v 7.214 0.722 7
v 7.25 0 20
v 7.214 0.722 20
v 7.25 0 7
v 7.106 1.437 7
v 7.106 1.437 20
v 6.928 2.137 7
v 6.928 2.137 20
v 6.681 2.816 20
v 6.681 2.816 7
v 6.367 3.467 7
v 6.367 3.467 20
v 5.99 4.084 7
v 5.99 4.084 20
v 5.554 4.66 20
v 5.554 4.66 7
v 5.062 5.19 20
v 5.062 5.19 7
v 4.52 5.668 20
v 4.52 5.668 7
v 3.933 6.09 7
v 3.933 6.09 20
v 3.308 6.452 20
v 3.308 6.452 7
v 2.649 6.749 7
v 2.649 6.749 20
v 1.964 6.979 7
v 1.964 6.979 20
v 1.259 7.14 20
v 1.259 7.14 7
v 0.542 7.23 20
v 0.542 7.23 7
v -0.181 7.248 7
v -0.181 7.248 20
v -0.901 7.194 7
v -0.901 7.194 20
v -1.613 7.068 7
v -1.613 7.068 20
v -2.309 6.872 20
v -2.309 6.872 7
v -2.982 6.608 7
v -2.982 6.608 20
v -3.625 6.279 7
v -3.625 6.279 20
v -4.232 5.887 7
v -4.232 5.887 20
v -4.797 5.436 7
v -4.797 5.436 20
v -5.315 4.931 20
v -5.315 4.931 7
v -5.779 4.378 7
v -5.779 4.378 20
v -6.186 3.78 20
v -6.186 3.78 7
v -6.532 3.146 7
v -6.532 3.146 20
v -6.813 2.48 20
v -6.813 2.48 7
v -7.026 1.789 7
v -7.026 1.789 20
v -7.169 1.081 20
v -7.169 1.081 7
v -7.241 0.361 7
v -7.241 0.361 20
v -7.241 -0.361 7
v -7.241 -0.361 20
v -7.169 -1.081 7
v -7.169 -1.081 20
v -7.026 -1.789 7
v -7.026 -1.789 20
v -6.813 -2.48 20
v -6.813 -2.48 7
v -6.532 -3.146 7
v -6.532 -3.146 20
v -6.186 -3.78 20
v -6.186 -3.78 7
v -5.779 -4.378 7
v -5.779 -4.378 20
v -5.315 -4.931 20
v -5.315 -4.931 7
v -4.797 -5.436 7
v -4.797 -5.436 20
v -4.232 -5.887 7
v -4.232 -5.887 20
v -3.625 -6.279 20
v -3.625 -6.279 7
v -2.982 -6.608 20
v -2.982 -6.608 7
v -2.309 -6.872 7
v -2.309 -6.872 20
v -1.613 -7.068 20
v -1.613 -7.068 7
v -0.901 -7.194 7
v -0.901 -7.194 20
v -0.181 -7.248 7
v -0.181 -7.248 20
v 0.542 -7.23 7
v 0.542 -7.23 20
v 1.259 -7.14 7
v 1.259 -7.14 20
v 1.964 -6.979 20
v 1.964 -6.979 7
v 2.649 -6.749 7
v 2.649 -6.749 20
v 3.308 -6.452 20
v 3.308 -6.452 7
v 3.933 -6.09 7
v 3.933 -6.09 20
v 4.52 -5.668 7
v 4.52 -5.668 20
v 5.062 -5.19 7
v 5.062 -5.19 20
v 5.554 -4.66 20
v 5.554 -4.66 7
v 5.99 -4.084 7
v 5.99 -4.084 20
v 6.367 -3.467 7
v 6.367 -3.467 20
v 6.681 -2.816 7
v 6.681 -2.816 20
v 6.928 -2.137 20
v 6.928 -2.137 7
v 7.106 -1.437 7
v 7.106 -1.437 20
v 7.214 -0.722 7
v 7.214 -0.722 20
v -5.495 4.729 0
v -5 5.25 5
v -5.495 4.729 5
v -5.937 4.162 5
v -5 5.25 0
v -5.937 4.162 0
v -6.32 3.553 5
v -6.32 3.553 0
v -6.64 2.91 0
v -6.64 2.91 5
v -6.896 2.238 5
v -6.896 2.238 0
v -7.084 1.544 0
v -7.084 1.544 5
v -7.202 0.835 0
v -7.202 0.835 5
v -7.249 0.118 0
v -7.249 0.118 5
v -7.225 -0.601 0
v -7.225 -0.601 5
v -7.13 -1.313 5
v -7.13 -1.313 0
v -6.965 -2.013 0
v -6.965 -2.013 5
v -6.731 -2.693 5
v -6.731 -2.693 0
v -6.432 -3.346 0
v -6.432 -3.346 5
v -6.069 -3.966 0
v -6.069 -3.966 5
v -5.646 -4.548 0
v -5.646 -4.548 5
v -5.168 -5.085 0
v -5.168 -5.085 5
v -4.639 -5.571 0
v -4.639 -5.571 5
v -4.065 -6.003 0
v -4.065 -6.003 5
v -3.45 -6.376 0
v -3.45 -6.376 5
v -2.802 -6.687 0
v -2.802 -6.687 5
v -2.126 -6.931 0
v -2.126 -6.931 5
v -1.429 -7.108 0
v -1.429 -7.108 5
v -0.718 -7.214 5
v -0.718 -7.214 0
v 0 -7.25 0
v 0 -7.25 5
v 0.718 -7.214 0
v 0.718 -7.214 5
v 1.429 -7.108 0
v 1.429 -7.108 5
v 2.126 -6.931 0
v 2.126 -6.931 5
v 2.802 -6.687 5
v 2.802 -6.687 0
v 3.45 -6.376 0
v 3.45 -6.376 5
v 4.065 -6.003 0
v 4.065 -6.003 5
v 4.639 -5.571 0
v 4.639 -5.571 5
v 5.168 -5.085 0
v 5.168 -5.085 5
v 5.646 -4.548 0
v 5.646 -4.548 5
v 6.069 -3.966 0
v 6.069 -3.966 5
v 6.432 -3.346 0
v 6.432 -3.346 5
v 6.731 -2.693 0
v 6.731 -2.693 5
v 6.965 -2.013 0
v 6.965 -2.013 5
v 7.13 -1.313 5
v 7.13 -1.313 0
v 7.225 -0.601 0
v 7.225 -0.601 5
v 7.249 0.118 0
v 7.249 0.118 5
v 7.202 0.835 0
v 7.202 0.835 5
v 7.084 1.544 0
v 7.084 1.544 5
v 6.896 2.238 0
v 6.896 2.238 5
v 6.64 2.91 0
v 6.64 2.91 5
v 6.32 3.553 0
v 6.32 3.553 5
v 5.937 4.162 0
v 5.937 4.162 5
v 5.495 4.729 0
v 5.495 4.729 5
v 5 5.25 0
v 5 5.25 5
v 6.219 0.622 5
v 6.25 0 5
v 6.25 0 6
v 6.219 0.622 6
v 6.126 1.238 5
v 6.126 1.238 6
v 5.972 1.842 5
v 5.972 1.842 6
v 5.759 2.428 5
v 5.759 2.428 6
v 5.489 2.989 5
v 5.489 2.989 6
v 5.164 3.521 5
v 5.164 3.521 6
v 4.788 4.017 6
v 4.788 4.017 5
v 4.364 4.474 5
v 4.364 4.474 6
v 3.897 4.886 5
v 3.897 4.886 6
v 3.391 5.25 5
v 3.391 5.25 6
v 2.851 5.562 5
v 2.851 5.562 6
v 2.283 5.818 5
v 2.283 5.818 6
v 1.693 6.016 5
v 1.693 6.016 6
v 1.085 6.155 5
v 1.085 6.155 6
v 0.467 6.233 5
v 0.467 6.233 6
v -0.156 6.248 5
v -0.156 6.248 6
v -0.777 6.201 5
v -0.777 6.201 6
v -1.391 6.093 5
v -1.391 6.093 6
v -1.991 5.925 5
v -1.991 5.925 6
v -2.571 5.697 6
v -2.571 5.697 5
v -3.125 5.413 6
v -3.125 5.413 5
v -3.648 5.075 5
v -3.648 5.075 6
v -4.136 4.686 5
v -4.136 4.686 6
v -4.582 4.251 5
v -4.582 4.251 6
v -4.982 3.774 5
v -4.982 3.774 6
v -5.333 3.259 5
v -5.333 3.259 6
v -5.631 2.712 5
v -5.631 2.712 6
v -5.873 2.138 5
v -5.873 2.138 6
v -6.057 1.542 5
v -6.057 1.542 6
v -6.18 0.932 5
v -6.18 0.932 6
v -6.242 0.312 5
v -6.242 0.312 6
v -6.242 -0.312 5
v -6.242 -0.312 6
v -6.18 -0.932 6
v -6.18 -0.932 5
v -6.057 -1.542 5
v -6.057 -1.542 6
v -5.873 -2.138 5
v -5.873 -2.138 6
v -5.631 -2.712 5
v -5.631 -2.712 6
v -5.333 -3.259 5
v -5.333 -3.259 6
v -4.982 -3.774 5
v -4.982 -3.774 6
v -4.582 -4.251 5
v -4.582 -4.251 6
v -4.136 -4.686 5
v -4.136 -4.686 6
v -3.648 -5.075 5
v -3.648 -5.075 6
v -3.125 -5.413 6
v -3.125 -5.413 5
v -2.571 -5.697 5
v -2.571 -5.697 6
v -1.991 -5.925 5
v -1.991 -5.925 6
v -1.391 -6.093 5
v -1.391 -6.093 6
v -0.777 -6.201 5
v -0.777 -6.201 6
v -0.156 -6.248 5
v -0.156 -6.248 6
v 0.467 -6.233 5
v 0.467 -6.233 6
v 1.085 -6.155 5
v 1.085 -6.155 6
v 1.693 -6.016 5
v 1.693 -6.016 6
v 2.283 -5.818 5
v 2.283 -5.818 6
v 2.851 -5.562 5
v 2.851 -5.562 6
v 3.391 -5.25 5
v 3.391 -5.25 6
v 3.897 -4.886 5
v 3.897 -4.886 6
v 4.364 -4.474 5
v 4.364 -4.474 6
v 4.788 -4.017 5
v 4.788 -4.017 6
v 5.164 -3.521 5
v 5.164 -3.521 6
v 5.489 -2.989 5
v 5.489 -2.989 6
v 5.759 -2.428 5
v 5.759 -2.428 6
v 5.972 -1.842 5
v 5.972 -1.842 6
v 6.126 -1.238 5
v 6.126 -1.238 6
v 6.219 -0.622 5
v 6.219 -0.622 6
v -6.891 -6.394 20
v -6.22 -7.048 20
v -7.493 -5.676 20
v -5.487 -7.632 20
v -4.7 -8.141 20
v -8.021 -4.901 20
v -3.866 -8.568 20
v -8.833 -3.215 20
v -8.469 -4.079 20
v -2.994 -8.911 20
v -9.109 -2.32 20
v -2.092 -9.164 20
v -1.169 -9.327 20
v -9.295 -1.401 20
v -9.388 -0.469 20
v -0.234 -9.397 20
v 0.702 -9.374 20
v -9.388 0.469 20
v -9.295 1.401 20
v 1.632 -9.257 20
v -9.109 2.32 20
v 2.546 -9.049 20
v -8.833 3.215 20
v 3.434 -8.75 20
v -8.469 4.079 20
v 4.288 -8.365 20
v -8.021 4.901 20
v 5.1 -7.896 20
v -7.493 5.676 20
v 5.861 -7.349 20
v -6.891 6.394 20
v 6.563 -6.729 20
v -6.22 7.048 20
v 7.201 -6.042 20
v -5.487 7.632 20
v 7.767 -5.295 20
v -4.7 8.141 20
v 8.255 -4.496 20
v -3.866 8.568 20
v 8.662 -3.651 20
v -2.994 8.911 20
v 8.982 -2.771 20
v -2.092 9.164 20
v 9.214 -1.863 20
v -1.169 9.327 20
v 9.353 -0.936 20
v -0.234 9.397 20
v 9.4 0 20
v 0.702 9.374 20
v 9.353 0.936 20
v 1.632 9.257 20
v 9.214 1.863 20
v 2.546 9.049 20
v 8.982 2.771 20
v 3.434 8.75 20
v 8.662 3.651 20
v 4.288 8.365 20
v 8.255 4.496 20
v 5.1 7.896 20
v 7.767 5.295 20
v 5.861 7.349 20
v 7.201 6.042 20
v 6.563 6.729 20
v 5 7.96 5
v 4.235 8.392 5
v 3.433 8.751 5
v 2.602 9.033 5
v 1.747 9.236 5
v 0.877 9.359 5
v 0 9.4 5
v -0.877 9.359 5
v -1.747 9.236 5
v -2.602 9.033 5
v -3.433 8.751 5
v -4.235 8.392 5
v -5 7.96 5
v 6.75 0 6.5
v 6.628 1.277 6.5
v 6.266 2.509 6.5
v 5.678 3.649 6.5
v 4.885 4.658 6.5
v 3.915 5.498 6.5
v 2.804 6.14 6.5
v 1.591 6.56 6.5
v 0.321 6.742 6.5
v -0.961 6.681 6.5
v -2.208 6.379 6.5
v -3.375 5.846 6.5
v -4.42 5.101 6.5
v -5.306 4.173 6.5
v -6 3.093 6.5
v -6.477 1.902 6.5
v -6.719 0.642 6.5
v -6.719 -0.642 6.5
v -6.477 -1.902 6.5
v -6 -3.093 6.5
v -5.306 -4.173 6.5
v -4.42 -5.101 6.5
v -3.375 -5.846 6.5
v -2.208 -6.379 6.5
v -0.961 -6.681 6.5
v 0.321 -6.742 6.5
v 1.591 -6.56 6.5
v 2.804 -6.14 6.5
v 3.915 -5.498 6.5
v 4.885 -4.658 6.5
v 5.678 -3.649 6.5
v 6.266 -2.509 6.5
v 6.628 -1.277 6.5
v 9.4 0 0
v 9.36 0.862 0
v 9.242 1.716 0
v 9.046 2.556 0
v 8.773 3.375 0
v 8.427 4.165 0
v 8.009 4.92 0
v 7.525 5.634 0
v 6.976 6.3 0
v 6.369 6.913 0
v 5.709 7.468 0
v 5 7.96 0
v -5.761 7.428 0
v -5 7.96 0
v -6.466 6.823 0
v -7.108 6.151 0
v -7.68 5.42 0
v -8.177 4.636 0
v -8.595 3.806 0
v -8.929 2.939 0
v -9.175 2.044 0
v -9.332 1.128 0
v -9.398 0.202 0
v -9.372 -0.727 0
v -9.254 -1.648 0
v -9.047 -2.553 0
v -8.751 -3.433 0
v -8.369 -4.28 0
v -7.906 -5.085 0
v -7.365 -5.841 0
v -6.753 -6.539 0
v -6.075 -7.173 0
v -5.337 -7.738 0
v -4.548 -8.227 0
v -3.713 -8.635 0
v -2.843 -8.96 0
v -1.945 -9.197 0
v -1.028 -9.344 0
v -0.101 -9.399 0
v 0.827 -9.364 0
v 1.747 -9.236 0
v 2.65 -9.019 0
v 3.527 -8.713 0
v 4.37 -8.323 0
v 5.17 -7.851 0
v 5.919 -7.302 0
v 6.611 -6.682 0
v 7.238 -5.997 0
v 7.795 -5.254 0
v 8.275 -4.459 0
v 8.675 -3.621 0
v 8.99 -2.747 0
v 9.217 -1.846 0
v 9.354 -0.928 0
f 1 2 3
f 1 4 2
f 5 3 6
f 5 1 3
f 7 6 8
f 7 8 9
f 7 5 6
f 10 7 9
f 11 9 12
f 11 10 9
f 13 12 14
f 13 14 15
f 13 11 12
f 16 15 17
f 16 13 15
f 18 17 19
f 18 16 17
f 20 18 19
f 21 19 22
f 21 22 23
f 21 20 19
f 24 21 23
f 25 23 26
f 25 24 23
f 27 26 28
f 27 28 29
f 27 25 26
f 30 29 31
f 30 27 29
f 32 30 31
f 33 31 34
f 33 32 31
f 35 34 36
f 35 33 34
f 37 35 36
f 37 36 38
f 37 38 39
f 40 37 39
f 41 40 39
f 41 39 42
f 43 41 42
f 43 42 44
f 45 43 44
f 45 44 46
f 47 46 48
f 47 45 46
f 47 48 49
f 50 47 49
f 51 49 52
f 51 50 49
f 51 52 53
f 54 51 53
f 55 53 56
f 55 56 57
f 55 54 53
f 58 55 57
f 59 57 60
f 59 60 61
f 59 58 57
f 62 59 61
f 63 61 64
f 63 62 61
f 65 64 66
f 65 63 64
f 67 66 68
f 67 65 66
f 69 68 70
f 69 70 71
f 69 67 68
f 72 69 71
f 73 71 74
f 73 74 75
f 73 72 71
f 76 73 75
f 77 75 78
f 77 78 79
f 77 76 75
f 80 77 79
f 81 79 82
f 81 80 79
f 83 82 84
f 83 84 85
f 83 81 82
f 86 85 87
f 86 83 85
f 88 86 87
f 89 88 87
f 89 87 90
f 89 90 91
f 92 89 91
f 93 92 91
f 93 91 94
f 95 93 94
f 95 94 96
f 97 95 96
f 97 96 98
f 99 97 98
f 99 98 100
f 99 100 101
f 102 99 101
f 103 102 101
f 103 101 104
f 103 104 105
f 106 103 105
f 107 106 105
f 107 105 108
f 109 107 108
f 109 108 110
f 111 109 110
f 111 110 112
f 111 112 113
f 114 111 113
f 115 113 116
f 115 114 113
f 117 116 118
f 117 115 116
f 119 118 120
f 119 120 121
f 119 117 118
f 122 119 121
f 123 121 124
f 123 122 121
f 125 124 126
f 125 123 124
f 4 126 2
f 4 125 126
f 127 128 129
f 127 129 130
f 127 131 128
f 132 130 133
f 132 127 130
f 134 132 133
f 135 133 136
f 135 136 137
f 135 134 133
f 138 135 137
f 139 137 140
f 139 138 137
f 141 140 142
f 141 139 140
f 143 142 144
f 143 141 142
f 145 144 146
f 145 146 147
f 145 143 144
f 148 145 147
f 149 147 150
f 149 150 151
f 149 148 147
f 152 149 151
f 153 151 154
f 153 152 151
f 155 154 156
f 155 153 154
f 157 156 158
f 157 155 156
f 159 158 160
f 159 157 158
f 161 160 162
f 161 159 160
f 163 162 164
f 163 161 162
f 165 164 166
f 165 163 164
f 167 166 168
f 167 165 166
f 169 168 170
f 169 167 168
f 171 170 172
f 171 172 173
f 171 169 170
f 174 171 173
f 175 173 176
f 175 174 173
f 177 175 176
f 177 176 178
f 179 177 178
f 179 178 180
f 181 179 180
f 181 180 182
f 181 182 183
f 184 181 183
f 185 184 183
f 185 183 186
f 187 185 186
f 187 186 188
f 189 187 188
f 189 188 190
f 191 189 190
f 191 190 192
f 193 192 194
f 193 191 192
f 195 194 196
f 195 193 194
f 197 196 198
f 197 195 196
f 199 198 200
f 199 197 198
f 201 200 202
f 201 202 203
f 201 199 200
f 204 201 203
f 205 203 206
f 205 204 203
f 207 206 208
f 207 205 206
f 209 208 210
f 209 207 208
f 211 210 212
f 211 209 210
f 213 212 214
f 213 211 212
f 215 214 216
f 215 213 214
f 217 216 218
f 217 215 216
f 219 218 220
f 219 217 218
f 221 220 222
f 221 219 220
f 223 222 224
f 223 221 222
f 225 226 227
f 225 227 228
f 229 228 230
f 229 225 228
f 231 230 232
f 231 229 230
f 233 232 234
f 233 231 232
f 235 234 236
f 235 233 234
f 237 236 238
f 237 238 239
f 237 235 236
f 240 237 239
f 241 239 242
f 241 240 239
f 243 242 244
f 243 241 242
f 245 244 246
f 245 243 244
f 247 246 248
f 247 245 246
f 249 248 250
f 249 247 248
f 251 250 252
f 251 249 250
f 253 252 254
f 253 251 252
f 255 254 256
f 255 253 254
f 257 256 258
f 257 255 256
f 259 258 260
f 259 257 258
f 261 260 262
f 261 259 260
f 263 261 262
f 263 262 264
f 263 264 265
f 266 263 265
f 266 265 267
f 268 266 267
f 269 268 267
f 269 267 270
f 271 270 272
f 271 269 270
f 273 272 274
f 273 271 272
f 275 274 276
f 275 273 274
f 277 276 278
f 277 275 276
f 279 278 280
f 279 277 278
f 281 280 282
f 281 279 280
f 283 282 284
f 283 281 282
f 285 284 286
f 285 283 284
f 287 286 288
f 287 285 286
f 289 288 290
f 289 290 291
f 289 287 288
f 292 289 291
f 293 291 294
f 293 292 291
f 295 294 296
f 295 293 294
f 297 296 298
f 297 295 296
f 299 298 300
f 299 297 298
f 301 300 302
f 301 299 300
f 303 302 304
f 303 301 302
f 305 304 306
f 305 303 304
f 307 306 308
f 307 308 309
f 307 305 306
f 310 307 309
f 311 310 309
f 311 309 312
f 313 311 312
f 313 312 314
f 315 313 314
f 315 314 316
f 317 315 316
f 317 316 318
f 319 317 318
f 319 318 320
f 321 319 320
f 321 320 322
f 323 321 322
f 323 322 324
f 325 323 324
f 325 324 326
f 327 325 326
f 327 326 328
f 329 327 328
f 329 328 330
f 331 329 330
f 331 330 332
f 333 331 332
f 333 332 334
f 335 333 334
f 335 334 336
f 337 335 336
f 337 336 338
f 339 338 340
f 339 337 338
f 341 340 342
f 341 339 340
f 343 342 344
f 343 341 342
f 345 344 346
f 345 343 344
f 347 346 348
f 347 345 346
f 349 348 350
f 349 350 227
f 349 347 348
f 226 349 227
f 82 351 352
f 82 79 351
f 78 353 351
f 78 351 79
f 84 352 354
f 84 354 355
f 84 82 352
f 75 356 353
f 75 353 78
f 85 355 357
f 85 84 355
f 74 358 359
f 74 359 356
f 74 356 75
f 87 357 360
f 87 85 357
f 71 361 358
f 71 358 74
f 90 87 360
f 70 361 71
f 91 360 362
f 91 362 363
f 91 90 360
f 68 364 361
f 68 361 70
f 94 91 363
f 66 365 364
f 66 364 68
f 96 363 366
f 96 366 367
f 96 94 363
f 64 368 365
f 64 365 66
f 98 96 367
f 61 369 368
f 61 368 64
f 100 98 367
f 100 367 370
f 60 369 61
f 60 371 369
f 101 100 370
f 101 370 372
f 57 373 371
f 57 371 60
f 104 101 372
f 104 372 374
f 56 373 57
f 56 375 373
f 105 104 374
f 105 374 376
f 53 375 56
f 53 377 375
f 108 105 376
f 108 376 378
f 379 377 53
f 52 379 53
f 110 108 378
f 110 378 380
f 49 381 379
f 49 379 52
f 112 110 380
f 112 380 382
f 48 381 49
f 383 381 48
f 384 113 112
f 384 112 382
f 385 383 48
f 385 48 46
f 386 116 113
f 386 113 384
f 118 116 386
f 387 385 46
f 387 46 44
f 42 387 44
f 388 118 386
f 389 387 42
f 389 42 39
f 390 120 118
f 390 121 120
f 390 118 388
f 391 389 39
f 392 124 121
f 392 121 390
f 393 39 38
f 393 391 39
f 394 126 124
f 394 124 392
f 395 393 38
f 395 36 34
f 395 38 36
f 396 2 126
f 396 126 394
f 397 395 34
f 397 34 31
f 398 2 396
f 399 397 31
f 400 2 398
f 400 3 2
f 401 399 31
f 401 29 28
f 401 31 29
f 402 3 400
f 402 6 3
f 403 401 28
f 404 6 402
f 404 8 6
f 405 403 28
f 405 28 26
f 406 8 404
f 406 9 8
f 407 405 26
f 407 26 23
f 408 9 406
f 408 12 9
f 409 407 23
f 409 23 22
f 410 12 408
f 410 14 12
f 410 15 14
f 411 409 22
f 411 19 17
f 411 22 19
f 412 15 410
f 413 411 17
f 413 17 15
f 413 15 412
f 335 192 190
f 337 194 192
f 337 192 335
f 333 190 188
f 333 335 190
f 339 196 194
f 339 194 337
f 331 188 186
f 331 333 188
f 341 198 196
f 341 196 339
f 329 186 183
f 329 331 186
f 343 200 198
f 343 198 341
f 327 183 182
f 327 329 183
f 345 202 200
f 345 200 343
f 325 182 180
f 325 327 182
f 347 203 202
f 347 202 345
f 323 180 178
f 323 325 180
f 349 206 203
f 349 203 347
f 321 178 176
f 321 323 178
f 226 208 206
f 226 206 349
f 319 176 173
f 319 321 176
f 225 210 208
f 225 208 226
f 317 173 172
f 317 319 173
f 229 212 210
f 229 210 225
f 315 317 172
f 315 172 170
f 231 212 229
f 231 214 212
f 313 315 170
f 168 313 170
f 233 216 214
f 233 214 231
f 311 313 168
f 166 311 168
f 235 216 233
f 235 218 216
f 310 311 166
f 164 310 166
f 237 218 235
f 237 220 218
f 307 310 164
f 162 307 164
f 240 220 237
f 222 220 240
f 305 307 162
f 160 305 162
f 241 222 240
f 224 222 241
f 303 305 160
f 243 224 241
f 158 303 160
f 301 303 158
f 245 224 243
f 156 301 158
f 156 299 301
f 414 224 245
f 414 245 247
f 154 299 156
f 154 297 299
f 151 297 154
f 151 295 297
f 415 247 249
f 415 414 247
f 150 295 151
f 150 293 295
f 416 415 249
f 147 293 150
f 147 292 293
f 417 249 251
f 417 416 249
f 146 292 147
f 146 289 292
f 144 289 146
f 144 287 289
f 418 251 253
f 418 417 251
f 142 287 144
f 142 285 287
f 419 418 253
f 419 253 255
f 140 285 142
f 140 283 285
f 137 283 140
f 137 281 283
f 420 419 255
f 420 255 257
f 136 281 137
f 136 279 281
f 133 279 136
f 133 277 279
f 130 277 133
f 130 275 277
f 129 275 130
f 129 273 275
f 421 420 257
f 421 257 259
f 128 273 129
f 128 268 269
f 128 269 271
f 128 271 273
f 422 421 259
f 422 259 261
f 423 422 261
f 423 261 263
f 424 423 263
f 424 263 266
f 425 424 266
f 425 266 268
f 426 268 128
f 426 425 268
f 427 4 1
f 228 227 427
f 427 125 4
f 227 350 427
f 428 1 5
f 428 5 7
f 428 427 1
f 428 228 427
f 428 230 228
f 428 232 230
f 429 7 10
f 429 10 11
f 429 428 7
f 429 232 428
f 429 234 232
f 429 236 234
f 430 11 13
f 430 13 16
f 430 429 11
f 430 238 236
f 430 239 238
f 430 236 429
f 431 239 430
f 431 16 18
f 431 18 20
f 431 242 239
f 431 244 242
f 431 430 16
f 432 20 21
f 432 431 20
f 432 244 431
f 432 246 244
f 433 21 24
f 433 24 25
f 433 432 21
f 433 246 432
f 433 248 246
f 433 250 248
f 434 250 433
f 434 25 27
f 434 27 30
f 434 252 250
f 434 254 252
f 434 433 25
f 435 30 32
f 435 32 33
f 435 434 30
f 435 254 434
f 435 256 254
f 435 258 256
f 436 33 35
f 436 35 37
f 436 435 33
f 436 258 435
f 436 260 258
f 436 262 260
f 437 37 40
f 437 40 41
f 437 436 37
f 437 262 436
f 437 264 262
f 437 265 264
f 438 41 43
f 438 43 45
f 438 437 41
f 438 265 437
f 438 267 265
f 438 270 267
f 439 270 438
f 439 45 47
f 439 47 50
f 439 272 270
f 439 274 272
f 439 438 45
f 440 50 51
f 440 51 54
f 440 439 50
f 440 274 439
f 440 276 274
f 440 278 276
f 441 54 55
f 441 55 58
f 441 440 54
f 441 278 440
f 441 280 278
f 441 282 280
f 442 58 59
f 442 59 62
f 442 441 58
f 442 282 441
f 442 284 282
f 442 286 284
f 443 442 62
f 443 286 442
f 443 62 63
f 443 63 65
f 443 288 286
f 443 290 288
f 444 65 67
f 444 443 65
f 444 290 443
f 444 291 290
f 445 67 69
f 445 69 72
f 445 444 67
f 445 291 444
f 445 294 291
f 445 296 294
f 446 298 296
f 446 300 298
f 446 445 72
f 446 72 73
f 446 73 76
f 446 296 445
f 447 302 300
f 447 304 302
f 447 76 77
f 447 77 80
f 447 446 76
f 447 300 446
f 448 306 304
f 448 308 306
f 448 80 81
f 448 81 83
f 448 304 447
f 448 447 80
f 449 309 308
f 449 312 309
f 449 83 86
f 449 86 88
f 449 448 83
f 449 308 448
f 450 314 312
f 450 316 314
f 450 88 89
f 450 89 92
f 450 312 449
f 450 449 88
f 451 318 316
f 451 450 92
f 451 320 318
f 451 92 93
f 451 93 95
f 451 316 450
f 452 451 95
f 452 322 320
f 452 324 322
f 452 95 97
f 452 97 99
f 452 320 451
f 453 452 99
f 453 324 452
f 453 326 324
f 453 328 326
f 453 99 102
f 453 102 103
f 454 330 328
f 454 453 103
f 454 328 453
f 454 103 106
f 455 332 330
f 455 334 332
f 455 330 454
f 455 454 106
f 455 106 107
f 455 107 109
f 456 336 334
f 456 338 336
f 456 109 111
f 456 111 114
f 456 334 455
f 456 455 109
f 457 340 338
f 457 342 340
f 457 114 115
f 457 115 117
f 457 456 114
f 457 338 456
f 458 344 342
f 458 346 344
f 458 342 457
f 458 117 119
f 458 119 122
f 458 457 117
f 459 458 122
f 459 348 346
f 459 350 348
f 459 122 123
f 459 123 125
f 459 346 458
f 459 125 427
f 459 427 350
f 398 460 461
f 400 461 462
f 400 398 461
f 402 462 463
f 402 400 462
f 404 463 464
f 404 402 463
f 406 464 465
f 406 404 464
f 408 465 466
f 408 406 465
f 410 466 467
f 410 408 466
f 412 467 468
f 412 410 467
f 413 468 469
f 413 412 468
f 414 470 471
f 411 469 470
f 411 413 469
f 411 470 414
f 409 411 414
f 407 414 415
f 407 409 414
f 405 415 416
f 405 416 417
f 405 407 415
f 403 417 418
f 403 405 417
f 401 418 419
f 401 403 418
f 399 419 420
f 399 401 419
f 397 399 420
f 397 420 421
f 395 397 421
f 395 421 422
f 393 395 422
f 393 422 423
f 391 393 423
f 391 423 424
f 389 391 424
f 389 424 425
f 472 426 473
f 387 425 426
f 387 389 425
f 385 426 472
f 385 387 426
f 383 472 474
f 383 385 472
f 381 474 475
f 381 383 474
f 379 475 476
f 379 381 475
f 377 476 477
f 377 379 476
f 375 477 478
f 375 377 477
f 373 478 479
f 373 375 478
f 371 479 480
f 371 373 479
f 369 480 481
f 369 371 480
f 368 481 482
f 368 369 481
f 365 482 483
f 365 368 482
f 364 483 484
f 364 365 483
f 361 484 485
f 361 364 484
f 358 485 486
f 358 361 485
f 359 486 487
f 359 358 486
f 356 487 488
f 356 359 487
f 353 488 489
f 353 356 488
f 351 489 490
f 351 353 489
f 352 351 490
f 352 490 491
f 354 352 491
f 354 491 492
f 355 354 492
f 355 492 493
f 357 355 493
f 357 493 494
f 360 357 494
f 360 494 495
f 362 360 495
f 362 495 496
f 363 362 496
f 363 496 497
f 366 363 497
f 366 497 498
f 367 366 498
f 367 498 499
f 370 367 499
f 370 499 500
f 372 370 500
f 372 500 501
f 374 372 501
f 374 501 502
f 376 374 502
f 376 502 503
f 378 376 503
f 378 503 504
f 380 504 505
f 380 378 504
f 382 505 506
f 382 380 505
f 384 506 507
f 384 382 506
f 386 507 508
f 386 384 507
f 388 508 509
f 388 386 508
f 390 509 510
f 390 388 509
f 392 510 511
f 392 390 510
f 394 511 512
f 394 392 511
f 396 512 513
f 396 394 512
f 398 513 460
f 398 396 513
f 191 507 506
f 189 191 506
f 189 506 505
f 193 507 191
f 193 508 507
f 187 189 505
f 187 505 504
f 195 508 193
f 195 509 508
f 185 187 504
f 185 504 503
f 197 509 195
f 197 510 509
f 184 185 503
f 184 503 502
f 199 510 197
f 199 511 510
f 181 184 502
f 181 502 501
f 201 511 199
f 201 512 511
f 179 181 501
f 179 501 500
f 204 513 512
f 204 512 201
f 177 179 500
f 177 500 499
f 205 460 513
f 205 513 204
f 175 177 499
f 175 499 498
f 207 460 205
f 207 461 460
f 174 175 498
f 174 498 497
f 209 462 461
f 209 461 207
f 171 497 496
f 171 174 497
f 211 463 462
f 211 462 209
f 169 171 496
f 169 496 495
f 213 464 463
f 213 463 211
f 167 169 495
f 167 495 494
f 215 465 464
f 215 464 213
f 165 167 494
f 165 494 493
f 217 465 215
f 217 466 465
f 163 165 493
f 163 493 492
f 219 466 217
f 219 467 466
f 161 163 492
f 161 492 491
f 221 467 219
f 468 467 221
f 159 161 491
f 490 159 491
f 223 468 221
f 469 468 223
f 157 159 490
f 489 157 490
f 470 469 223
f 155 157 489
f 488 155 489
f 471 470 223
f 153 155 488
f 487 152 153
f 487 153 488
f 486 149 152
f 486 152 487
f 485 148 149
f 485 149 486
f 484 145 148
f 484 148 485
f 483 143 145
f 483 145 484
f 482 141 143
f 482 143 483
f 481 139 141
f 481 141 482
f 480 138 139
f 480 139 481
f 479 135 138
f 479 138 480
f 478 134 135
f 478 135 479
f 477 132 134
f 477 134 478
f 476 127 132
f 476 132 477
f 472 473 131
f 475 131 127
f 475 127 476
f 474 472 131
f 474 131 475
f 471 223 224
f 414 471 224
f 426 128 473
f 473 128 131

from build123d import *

# Parameters (mm, degrees)
F3_DEPTH = 25


with BuildPart() as f1:
    # F0 (on Front) → F1 (revolve)
    with BuildSketch(Plane.XZ):
        Polygon((7.25, 0), (9.4, 0), (9.4, 20), (7.25, 20), (7.25, 7), (6.25, 6), (6.25, 5), (7.25, 5), align=None)
    revolve(axis=Axis((0, 0, 5), (0, 0, 1)))

    # F2 (on Front) → F3 (cut)
    with BuildSketch(Plane.XZ):
        Polygon((5, 5), (-5, 5), (-5, 0), (0, 0), (5, 0), align=None)
    extrude(amount=-F3_DEPTH, mode=Mode.SUBTRACT)


solid = f1.part
